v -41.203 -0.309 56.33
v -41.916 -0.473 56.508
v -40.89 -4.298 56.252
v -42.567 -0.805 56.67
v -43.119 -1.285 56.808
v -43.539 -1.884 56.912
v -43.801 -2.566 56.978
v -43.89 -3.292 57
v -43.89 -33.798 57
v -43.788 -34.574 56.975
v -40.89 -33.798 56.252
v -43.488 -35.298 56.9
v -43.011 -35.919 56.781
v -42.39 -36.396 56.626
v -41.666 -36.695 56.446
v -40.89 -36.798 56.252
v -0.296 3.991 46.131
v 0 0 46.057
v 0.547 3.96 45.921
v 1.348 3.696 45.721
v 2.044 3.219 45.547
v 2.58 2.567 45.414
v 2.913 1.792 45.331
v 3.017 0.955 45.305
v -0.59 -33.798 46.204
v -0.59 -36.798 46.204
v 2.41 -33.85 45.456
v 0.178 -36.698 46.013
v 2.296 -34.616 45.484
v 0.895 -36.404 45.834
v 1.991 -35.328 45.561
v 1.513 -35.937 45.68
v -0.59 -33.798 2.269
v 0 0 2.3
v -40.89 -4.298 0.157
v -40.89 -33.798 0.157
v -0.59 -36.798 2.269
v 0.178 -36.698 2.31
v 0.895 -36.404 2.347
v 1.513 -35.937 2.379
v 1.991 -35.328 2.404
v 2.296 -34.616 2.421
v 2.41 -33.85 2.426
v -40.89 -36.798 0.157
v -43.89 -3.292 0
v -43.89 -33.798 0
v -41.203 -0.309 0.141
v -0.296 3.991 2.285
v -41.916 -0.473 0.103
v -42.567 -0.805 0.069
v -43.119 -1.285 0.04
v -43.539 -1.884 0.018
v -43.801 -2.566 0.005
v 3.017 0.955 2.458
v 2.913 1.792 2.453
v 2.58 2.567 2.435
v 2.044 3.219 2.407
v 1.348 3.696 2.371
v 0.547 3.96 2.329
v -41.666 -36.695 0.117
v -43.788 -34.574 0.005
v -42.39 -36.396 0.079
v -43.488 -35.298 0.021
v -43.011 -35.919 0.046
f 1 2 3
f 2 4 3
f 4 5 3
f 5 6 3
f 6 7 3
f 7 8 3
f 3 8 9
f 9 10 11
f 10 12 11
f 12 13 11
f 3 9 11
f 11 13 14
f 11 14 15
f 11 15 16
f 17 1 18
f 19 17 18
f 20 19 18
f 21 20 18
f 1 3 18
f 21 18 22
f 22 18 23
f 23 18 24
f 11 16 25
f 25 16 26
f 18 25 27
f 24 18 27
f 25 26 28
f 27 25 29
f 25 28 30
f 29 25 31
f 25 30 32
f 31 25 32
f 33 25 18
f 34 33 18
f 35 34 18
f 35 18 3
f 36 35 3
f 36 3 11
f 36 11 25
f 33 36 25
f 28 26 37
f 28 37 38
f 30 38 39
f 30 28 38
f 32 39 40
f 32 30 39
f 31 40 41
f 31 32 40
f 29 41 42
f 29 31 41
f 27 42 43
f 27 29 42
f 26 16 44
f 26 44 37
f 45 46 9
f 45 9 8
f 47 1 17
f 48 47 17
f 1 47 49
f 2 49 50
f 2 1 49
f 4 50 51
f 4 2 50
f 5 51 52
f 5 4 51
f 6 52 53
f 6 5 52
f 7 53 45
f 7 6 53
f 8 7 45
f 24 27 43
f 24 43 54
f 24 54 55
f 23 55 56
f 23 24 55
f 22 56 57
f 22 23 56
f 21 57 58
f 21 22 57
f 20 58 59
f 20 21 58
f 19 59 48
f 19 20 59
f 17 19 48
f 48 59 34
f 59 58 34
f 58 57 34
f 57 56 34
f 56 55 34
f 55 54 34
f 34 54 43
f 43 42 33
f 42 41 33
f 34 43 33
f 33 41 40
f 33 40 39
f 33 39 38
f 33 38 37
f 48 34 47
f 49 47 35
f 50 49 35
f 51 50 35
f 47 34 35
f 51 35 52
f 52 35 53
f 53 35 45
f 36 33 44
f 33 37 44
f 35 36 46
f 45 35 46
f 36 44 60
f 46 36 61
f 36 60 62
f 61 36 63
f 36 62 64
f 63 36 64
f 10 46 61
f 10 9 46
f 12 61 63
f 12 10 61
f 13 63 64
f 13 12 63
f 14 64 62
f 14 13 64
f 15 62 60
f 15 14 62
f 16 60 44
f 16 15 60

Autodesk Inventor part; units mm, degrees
ref_plane "YZ Plane" through (0, 0, 0) normal (1, 0, 0) x (0, 1, 0)
ref_plane "XZ Plane" through (0, 0, 0) normal (0, 1, 0) x (-1, 0, 0)
ref_plane "XY Plane" through (0, 0, 0) normal (0, 0, 1) x (1, 0, 0)
sketch "Skizze1" plane through (0, 0, 0) normal (0, 0, 1) x (1, 0, 0)
  line L0 (0, 0) -> (-40.8899, -4.2977)
  line L1 (-40.8899, -4.2977) -> (-40.8899, -33.7977)
  line L2 (-40.8899, -33.7977) -> (-0.5899, -33.7977)
  line L3 (-0.5899, -33.7977) -> (0, 0)
  line L4 (-43.8899, -0.591) -> (3.0763, 4.3454)
  line L5 (-43.8899, -36.7977) -> (-43.8899, -0.591)
  line L6 (-43.8899, -36.7977) -> (2.3582, -36.7977)
  line L7 (2.3582, -36.7977) -> (3.0763, 4.3454)
  dimension "d1" = 29.5
  dimension "d2" = 40.3
  dimension "d6" = 90
  dimension "d9" = 91
  dimension "d12" = 96
  dimension "d13" = 41.1152
  dimension "d14" = 33.8028
  dimension "d22" = 4
  dimension "d23" = 3
  dimension "d24" = 3
  dimension "d25" = 3
extrude "Extrusion1" add sketch "Skizze1" along normal blind 57
sketch "Skizze3" plane through (-43.8899, -36.7977, 0) normal (0, -1, 0) x (1, 0, 0)
  line L0 (0, 0) -> (46.2481, 0) construction
  line L1 (46.2481, 0) -> (46.2481, 57) construction
  line L2 (0, 57) -> (46.2481, 57) construction
  line L3 (0, 0) -> (0, 57) projected
  line L4 (0, 0) -> (46.2481, 0)
  line L5 (0, 57) -> (46.2481, 57) projected
  line L6 (0, 57) -> (46.9662, 45.29)
  line L7 (46.2481, 0) -> (46.2481, 57) projected
  line L8 (46.2481, 0) -> (46.9662, 0) projected
  line L9 (46.2481, 0) -> (46.9662, 0)
  line L10 (46.9662, 0) -> (46.9662, 2.4614)
  line L11 (46.9662, 2.4614) -> (0, 0)
  line L12 (46.9662, 0) -> (46.9662, 57) projected
  line L13 (46.9662, 45.29) -> (46.9662, 57)
  line L14 (46.9662, 57) -> (46.9662, 57)
  line L15 (0, 57) -> (46.9662, 57)
  point P0 (43.8899, 0)
  dimension "d27" = 76
  dimension "d30" = 87
extrude "Extrusion3" cut sketch "Skizze3" against normal blind 57 contours L11 L7 L4 | L5 L7 L6 | L7 L11 L10 L8 | L15 L12 L6 L7
fillet "Rundung1" radius 3 4 edges at (-43.8899, -36.7977, 28.5) (-43.8899, -0.591, 28.5) (2.3582, -36.7977, 23.9464) (3.0763, 4.3454, 23.8757)
equation "\"d24\" = d23"
equation "\"d25\" = d24"
properties part number "handle_top_final"
